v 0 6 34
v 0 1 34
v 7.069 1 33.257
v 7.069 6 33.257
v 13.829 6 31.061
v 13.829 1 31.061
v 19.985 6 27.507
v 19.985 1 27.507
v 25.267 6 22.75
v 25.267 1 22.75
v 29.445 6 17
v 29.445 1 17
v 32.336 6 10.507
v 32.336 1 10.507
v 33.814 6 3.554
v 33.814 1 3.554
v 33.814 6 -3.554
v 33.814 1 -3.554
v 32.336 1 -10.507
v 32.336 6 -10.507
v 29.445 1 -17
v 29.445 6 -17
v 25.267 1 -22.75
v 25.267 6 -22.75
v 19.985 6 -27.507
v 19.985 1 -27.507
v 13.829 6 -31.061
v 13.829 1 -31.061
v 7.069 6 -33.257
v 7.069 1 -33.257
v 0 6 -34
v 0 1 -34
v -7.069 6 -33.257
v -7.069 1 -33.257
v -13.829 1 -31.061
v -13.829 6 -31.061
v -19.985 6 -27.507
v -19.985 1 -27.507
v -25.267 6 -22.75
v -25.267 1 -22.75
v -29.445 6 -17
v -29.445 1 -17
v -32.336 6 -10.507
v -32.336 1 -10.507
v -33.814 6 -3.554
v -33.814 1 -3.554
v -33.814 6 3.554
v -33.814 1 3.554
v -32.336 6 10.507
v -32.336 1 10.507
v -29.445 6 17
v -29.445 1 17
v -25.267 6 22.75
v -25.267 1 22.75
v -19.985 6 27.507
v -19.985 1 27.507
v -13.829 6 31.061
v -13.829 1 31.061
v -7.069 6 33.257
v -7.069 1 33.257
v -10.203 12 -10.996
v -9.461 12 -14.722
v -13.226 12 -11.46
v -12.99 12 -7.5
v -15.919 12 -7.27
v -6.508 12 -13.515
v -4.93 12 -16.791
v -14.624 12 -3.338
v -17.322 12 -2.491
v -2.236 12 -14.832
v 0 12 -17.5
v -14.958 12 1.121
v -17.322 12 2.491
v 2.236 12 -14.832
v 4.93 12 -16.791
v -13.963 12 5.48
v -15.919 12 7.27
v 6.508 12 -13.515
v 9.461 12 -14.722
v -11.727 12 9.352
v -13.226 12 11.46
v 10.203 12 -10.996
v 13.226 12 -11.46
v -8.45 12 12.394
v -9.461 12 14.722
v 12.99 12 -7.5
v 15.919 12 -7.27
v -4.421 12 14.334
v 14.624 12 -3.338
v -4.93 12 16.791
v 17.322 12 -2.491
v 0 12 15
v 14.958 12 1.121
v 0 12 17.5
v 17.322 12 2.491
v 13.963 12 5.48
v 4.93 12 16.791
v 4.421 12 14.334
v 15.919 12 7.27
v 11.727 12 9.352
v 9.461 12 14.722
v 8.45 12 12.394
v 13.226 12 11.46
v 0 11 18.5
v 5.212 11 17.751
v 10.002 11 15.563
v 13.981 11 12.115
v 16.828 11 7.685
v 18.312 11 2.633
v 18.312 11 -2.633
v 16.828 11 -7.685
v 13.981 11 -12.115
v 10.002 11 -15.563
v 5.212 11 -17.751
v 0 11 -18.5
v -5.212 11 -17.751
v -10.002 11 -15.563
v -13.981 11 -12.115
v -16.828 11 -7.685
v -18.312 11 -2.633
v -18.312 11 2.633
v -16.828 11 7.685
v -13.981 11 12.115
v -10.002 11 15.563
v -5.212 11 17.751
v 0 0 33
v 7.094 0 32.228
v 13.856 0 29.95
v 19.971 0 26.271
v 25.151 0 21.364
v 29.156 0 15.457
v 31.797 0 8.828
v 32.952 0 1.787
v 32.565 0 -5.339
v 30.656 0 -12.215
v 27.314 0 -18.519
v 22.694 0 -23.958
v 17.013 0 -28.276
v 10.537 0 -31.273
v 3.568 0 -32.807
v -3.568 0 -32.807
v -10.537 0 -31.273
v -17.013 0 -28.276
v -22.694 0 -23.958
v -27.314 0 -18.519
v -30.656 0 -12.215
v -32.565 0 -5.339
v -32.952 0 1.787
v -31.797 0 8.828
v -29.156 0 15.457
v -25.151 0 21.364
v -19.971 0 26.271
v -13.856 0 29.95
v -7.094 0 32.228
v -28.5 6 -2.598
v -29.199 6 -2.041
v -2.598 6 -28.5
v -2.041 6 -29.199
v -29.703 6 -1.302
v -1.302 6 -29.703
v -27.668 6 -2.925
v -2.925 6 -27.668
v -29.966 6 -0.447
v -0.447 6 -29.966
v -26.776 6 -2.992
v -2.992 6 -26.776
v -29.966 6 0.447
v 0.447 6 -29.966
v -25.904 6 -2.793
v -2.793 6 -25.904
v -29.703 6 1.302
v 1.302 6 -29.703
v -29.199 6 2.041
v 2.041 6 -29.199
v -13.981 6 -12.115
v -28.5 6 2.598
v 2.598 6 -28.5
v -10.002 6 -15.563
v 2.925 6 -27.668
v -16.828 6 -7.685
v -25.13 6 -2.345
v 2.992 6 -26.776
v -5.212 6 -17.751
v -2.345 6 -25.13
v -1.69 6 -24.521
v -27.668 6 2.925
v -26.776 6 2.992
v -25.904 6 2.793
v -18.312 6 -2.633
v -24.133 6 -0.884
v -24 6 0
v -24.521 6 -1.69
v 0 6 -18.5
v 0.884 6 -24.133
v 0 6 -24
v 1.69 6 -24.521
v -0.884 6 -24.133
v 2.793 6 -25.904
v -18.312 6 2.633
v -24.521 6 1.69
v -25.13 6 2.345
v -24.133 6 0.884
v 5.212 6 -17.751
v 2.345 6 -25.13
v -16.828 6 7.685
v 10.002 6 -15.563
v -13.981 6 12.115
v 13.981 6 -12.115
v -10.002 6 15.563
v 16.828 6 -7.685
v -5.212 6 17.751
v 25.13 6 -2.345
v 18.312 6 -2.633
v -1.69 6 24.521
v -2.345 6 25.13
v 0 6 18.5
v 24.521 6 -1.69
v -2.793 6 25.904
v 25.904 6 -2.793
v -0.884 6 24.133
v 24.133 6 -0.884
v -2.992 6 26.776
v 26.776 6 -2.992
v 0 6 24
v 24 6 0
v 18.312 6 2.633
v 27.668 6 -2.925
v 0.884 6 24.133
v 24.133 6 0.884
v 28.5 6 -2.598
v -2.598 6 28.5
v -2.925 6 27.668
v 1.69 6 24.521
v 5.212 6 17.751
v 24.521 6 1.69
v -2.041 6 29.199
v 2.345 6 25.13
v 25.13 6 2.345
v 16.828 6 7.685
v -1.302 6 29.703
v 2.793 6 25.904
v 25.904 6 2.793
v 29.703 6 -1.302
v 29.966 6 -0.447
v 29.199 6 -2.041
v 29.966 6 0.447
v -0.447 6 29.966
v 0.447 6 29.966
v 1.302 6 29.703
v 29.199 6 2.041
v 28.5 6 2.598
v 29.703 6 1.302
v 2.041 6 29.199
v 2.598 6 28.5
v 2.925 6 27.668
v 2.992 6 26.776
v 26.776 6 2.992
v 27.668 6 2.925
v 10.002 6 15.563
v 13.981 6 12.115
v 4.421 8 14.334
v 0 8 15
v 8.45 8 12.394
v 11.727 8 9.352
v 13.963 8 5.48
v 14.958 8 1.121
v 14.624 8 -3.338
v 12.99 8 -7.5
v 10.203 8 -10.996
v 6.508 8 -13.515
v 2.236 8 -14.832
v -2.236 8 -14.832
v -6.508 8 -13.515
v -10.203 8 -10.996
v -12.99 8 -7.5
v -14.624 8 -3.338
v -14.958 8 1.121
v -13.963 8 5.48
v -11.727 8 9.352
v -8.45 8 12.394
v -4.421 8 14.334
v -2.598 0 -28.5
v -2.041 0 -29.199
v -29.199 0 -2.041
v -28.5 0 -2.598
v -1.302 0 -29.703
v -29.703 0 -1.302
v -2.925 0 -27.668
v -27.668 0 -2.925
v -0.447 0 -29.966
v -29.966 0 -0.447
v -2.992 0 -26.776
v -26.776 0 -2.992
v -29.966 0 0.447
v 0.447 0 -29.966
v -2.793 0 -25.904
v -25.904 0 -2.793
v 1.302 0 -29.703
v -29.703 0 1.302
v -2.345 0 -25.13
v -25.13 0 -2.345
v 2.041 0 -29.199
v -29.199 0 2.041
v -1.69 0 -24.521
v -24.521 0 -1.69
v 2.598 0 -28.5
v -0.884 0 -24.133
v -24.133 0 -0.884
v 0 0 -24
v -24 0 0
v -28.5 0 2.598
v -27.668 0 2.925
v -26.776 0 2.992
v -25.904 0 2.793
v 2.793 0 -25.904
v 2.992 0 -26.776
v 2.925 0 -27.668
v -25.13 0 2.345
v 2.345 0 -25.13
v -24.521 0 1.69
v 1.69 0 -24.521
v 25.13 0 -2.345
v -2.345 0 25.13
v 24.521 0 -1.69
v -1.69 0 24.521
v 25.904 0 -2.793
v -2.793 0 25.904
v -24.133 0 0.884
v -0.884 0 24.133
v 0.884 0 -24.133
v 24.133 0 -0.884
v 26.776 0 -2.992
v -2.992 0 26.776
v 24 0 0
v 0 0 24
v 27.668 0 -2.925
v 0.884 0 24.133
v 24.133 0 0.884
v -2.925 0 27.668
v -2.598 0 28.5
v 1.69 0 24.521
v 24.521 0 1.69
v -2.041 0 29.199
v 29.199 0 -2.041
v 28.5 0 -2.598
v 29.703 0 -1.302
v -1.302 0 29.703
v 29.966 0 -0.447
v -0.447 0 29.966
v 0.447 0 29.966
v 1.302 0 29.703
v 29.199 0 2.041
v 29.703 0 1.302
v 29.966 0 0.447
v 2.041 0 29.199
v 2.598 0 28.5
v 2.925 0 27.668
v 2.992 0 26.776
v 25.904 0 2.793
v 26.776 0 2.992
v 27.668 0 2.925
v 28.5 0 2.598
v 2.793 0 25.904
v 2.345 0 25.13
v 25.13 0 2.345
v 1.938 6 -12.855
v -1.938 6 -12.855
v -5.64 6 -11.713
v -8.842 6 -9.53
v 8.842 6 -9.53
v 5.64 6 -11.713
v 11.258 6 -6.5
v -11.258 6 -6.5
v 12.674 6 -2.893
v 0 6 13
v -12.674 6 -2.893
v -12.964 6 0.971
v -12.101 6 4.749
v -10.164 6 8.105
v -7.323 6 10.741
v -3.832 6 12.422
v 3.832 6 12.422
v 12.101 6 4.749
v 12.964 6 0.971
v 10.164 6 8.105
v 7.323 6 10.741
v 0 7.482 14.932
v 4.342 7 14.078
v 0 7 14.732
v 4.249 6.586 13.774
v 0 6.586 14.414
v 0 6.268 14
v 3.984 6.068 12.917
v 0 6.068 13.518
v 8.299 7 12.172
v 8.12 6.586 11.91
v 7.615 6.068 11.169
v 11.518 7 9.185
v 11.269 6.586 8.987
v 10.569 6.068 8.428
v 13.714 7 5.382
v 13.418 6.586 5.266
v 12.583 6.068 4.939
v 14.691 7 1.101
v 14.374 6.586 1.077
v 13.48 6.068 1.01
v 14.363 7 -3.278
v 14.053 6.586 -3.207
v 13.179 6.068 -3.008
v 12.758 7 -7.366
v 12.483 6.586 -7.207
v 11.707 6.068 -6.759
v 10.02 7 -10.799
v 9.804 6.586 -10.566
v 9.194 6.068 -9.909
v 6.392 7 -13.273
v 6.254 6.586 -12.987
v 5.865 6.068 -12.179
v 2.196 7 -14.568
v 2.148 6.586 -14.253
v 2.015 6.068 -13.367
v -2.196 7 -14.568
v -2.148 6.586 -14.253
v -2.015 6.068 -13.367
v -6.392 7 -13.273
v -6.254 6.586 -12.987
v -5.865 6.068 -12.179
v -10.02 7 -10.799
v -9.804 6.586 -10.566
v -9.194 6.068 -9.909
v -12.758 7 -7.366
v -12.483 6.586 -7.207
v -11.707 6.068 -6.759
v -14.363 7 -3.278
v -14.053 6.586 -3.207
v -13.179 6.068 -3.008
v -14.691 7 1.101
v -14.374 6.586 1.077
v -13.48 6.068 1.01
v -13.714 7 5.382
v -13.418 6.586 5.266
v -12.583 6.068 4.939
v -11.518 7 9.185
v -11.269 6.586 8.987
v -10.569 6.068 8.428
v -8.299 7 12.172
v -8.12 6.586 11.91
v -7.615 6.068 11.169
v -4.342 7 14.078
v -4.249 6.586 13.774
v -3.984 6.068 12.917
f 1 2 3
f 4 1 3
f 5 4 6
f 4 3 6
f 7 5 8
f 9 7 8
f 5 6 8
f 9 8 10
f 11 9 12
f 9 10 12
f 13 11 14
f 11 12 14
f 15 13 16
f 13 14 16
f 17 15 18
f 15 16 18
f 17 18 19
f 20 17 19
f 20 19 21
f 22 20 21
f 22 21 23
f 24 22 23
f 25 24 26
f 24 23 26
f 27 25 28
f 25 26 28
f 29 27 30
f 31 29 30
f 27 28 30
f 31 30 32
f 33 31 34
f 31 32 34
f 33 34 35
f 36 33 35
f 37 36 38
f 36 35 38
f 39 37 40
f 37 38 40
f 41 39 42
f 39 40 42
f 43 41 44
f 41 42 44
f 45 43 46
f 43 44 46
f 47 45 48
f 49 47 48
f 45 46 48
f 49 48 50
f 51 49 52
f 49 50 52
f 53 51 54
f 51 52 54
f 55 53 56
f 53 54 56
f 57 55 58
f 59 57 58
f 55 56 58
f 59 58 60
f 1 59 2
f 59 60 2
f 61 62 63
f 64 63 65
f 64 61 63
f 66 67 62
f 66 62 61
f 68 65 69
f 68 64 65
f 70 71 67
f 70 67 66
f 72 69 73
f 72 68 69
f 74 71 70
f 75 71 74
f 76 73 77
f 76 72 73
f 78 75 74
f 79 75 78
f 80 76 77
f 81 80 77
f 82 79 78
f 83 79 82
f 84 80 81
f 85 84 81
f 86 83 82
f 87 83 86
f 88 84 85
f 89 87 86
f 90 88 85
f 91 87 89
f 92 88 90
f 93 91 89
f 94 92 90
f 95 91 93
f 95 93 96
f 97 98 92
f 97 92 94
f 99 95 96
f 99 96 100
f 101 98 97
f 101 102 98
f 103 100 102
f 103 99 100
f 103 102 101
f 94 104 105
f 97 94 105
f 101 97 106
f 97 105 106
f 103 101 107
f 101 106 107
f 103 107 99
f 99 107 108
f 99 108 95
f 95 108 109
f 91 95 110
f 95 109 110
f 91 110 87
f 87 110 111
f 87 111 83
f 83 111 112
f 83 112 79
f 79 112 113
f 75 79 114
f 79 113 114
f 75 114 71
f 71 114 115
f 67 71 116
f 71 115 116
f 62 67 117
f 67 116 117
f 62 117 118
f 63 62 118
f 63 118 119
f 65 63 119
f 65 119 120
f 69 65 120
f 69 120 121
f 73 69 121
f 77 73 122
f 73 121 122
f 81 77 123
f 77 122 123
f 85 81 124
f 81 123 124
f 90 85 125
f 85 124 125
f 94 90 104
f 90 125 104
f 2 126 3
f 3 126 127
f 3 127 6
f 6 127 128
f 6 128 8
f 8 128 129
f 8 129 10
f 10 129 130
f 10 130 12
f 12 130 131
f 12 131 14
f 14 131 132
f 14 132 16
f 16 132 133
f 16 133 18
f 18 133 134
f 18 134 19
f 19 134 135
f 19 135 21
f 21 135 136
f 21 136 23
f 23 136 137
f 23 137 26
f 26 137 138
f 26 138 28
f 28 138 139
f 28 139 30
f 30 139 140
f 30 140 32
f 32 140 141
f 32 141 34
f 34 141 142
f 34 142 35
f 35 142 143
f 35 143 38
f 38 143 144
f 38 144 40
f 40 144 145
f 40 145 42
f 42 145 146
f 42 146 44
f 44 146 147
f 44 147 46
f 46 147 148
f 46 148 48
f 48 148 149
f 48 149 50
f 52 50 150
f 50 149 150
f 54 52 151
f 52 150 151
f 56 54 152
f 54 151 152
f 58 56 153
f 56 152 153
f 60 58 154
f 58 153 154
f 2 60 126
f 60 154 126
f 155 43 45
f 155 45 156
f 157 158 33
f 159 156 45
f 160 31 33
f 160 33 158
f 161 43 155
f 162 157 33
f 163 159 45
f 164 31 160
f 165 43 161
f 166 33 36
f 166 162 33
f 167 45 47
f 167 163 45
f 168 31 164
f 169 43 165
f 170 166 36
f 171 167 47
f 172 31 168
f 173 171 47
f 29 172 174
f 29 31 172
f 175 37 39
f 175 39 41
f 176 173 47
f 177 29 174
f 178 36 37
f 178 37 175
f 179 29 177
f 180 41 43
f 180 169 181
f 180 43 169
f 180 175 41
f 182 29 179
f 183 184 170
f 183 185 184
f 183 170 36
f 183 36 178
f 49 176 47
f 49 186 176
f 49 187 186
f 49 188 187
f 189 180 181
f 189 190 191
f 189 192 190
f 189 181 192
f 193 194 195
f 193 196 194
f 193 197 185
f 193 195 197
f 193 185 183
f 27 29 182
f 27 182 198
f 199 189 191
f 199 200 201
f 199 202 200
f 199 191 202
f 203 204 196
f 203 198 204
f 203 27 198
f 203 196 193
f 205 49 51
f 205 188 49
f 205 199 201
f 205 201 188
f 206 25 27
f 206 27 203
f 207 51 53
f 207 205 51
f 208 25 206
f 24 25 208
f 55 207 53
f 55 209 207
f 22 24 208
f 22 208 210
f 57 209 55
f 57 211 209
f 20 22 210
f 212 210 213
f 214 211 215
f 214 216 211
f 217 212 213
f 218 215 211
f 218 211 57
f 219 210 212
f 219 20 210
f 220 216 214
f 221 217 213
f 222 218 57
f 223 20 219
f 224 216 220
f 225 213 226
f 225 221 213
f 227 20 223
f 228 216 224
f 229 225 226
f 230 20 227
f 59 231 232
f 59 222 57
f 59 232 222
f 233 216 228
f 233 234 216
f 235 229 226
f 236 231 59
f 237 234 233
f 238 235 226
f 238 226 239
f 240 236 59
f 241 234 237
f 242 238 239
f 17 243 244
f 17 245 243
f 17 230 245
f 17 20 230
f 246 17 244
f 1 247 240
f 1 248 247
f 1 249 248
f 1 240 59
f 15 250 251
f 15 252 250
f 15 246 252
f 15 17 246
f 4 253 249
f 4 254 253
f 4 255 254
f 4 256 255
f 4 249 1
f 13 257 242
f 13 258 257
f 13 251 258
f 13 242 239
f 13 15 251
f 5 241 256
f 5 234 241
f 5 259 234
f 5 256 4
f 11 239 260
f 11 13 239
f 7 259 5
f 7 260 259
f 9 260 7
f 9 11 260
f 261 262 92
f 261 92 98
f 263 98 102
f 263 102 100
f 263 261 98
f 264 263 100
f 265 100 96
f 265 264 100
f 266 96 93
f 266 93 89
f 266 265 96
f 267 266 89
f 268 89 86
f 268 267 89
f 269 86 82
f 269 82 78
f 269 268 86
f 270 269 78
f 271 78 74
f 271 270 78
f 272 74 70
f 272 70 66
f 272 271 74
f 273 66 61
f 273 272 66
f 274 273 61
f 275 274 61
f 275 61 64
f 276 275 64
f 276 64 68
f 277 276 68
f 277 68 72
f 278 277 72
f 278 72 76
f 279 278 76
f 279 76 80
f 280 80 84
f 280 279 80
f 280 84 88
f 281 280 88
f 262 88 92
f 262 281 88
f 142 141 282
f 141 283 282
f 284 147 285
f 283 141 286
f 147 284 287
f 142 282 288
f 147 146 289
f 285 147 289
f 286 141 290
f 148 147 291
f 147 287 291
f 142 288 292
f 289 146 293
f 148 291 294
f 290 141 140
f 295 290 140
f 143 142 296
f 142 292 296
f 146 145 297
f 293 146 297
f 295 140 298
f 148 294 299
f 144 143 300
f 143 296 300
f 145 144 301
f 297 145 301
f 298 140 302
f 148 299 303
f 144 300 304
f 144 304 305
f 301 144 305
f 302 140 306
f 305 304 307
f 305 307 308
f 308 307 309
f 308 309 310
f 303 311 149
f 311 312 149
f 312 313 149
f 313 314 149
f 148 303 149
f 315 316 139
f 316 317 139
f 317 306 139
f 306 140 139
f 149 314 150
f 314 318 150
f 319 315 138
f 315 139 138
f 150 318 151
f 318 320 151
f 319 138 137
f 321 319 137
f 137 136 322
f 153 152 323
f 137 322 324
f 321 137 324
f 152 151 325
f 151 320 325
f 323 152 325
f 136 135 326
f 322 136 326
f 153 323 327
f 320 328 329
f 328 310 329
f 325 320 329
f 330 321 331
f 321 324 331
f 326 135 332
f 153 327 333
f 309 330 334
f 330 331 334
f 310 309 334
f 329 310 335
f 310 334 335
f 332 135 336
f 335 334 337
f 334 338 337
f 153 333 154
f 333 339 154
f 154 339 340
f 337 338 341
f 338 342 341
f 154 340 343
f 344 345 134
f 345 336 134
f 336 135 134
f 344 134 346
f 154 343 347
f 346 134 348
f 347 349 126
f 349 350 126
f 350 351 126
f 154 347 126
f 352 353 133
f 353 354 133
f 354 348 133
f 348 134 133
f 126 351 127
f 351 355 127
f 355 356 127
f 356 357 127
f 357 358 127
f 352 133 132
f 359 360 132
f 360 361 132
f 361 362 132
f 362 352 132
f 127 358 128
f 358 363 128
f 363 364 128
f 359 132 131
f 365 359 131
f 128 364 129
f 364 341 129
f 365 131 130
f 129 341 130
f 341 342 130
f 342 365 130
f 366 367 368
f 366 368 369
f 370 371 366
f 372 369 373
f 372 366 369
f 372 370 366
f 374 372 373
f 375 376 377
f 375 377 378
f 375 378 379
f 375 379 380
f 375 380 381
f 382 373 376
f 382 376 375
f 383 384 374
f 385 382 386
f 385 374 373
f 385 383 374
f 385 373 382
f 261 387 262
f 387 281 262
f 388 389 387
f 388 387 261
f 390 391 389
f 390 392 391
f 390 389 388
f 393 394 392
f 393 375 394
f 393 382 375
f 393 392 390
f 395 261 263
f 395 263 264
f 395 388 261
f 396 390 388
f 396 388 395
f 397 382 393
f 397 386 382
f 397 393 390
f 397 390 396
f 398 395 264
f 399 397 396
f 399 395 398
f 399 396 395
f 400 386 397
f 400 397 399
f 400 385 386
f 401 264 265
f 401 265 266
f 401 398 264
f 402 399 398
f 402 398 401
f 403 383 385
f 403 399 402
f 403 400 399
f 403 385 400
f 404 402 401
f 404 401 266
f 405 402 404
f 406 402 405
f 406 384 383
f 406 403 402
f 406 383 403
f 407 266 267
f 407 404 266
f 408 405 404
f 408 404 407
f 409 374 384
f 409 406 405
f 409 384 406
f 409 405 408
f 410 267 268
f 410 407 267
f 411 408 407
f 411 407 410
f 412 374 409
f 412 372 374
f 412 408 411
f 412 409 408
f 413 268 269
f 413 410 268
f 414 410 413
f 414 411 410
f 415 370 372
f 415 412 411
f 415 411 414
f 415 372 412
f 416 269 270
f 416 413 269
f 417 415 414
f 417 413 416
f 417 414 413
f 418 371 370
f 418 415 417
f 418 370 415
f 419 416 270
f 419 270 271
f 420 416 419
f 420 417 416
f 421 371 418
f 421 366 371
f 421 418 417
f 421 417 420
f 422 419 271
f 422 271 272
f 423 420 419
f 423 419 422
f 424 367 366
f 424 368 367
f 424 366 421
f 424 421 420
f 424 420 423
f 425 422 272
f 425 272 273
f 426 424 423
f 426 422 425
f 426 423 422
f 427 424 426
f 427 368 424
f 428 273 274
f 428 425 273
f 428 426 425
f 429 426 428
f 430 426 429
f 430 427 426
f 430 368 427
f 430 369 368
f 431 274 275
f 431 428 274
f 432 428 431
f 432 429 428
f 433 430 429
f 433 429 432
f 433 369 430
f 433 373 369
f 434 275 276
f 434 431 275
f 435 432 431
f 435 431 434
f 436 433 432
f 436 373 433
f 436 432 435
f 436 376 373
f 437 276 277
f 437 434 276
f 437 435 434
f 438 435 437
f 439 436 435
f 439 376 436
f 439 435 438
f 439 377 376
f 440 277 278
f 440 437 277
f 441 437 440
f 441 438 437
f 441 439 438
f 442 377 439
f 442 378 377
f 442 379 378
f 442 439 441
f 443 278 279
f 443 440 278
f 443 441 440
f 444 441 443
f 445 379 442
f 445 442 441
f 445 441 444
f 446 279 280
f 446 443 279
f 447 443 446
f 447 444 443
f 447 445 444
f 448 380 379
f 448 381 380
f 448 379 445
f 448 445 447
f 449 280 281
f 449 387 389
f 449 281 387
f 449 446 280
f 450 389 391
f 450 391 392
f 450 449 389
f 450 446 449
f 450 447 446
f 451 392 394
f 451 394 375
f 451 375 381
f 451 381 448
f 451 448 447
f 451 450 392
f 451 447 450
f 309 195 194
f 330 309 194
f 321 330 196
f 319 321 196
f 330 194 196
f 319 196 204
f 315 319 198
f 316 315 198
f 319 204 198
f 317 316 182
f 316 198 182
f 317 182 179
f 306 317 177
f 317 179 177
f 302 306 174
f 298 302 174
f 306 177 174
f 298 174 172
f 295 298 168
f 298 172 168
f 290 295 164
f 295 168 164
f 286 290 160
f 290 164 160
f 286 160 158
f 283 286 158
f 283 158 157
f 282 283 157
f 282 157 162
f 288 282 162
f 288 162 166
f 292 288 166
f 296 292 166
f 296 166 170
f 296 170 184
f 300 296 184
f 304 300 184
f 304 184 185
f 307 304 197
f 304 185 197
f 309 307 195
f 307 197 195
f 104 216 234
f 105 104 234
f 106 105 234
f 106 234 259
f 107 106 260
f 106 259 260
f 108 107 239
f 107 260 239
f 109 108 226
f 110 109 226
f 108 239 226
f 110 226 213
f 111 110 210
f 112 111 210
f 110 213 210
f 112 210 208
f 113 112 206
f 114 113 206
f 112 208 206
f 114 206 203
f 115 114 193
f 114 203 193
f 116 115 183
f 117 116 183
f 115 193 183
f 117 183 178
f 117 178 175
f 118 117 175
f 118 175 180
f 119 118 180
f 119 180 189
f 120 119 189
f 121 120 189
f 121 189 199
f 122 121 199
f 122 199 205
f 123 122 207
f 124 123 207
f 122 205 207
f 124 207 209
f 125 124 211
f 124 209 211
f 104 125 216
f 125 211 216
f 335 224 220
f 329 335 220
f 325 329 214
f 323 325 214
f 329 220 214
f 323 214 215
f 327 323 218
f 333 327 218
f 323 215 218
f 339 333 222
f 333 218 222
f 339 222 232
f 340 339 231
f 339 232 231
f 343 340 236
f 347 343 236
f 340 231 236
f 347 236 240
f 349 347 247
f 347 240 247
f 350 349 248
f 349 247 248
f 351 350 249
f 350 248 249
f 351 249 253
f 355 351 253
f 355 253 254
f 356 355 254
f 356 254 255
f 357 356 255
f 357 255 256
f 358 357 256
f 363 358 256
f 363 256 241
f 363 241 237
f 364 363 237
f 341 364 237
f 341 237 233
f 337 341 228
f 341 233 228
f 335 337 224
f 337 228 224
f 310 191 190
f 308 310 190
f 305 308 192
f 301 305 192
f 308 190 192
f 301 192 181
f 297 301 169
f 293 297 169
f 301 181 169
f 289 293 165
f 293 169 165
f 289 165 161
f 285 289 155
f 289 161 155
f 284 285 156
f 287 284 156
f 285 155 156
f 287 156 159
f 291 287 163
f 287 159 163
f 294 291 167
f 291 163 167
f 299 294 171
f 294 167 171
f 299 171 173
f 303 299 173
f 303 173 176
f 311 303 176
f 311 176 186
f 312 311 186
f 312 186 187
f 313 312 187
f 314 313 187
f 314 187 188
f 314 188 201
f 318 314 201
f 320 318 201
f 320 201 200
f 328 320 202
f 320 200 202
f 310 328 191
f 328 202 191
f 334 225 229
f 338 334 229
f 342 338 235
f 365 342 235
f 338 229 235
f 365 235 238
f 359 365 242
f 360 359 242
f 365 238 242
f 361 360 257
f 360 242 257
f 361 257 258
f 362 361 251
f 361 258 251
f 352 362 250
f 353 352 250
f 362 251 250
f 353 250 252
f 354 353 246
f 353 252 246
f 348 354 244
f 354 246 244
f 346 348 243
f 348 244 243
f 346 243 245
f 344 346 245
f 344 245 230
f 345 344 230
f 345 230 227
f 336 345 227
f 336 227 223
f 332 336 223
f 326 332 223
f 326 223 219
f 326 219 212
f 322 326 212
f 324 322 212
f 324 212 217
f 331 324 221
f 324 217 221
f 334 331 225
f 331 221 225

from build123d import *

# Parameters (mm, degrees)
SKETCH_1_R               = 34
EXTRUDE_1_DEPTH          = 6
SKETCH_2_R               = 18.5
SKETCH_2_R_2             = 15
EXTRUDE_2_DEPTH          = 6
SKETCH_5_R               = 3
CUT_EXTRUDE_1_DEPTH      = 6
PATTERN_CIRCULAR_1_COUNT = 4
FILLET_1_R               = 2
CHAMFER_1_SIZE           = 1


with BuildPart() as part:
    # 草图1 → 凸台-拉伸1 (new body)
    with BuildSketch(Plane(origin=(0, 0, 0), x_dir=(1, 0, 0), z_dir=(0, 1, 0))):
        with Locations(Location((0, 0, 0), (0, 0, 270))):
            Circle(SKETCH_1_R)
    extrude(amount=EXTRUDE_1_DEPTH)

    # 草图2 → 凸台-拉伸2 (add)
    with BuildSketch(Plane(origin=(0, 6, 0), x_dir=(1, 0, 0), z_dir=(0, 1, 0))):
        with Locations(Location((0, 0, 0), (0, 0, 270))):
            Circle(SKETCH_2_R)
        with Locations(Location((0, 0, 0), (0, 0, 270))):
            Circle(SKETCH_2_R_2, mode=Mode.SUBTRACT)
    extrude(amount=EXTRUDE_2_DEPTH)

    # 草图5 → 切除-拉伸1 (cut)
    with BuildSketch(Plane(origin=(0, 6, 0), x_dir=(1, 0, 0), z_dir=(0, 1, 0))):
        with Locations(Location((0, 27, 0), (0, 0, 270))):
            Circle(SKETCH_5_R)
    cut_extrude_1 = extrude(amount=-CUT_EXTRUDE_1_DEPTH, mode=Mode.SUBTRACT)

    # 阵列(圆周)1: 切除-拉伸1 ×4 about axis
    pattern_circular_1_axis = Axis((0, 0, 0), (0, 1, 0))
    for i in range(1, PATTERN_CIRCULAR_1_COUNT):
        add(cut_extrude_1.rotate(pattern_circular_1_axis, i * 360 / PATTERN_CIRCULAR_1_COUNT), mode=Mode.SUBTRACT)

    # 圆角1
    fillet_1_edges = [part.edges().sort_by_distance(p)[0] for p in [
        (0, 6, -15),
    ]]
    fillet(fillet_1_edges, radius=FILLET_1_R)

    # 倒角1
    chamfer_1_edges = [part.edges().sort_by_distance(p)[0] for p in [
        (0, 12, -18.5),
        (0, 0, -34),
    ]]
    chamfer(chamfer_1_edges, length=CHAMFER_1_SIZE)


solid = part.part
